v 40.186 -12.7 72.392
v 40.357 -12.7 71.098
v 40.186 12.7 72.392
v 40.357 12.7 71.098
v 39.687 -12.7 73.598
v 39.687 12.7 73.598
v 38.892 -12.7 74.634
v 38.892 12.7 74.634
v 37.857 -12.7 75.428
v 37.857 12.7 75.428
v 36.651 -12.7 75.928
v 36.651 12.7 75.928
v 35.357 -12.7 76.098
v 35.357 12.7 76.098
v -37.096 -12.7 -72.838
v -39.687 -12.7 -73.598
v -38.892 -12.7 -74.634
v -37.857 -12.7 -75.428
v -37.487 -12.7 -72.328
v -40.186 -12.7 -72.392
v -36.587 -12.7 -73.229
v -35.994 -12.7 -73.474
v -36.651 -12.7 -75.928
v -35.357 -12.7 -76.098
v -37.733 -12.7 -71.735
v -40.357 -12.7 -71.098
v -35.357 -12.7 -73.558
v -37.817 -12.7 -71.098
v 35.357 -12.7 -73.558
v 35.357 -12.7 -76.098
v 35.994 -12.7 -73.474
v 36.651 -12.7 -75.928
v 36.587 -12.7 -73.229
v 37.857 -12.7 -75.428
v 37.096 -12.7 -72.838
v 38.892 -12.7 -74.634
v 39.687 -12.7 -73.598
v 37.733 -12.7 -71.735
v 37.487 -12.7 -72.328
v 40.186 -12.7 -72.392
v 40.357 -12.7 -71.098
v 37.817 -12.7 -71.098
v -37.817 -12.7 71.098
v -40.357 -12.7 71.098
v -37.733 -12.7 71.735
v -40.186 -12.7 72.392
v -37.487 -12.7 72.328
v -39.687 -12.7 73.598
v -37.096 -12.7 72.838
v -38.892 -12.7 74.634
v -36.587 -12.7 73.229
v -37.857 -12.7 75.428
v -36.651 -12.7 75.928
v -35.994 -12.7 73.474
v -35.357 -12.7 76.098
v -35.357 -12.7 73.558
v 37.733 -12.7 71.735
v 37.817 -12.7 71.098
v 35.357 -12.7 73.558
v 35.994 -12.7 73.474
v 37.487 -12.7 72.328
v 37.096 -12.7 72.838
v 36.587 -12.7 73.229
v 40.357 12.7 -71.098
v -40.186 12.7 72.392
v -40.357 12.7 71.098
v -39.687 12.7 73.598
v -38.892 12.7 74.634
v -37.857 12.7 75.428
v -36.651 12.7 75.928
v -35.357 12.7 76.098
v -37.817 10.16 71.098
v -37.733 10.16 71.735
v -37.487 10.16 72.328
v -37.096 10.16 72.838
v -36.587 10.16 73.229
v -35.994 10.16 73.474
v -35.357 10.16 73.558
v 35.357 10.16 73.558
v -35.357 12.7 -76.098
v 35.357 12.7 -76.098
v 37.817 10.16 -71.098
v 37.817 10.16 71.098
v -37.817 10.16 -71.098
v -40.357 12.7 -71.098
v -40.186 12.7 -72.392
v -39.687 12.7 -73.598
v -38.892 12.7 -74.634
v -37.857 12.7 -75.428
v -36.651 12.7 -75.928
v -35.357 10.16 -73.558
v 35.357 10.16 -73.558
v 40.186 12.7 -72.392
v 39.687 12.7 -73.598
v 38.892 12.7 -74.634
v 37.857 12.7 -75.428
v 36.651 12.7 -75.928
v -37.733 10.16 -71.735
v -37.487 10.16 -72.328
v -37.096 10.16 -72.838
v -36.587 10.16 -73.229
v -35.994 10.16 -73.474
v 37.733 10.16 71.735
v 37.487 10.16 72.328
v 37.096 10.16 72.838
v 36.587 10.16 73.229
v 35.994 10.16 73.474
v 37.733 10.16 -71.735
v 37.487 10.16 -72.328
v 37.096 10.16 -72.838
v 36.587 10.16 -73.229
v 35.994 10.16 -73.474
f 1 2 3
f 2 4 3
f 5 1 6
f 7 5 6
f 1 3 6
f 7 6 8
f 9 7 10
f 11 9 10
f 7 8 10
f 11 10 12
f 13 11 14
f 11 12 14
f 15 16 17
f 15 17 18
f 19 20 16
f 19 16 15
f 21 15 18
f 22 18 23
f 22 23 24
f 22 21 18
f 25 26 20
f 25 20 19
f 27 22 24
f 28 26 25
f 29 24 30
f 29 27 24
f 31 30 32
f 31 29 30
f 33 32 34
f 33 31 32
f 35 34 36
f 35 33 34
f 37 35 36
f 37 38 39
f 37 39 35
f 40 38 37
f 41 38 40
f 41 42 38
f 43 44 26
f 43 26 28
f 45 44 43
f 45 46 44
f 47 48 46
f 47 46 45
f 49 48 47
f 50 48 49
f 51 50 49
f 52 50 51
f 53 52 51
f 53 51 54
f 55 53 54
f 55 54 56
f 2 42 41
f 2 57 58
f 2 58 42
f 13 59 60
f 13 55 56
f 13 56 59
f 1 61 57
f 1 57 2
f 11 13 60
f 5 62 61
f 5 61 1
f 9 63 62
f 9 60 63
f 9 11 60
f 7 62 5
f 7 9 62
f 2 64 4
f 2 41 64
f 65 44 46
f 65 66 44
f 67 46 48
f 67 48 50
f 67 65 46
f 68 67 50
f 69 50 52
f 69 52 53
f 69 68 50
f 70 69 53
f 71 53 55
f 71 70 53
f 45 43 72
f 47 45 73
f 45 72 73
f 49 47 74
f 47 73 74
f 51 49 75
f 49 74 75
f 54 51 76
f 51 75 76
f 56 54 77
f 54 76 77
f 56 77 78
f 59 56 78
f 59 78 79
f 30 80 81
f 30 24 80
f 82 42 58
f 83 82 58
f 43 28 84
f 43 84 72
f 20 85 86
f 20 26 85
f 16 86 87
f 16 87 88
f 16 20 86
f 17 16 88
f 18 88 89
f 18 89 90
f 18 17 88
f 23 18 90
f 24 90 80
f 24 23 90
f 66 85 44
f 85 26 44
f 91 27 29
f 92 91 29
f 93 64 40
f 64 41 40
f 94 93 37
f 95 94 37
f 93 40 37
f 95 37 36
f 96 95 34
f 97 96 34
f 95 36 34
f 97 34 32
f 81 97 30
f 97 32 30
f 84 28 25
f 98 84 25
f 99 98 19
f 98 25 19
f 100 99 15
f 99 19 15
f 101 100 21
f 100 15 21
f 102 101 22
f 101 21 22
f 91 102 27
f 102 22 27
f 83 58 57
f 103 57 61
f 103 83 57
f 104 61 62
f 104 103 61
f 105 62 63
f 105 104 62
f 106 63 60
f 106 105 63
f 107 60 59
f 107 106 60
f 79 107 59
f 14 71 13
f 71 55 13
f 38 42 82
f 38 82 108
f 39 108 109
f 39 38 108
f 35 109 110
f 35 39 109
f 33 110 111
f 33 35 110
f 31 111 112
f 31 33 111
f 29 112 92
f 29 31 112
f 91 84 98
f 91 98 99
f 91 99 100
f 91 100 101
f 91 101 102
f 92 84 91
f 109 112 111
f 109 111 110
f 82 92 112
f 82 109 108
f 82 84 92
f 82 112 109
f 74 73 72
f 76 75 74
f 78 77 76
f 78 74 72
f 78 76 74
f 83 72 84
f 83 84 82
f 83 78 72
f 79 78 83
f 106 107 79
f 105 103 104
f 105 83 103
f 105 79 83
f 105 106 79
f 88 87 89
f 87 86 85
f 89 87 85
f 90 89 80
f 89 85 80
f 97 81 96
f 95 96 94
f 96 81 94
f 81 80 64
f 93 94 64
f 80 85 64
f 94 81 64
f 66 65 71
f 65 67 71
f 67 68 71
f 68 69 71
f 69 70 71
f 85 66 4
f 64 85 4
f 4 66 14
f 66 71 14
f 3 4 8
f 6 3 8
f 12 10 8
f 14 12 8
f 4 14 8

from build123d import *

# Parameters (mm, degrees)
F0_W     = 80.713644
F0_H     = 152.196348
F1_DEPTH = 12.7
F2_R     = 5
F3_T     = -2.54


with BuildPart() as f1:
    # F0 (on Front) → F1 (new body, symmetric)
    with BuildSketch(Plane.XZ):
        Rectangle(F0_W, F0_H)
    extrude(amount=F1_DEPTH, both=True)

    # F2
    f2_edges = [f1.edges().sort_by_distance(p)[0] for p in [
        (-40.356822, 0, 76.098174),
        (40.356822, 0, 76.098174),
        (40.356822, 0, -76.098174),
        (-40.356822, 0, -76.098174),
    ]]
    fillet(f2_edges, radius=F2_R)

    # F3
    f3_openings = [f1.faces().sort_by_distance(p)[0] for p in [
        (0, -12.7, 0),
    ]]
    offset(amount=F3_T, openings=f3_openings)


solid = f1.part
